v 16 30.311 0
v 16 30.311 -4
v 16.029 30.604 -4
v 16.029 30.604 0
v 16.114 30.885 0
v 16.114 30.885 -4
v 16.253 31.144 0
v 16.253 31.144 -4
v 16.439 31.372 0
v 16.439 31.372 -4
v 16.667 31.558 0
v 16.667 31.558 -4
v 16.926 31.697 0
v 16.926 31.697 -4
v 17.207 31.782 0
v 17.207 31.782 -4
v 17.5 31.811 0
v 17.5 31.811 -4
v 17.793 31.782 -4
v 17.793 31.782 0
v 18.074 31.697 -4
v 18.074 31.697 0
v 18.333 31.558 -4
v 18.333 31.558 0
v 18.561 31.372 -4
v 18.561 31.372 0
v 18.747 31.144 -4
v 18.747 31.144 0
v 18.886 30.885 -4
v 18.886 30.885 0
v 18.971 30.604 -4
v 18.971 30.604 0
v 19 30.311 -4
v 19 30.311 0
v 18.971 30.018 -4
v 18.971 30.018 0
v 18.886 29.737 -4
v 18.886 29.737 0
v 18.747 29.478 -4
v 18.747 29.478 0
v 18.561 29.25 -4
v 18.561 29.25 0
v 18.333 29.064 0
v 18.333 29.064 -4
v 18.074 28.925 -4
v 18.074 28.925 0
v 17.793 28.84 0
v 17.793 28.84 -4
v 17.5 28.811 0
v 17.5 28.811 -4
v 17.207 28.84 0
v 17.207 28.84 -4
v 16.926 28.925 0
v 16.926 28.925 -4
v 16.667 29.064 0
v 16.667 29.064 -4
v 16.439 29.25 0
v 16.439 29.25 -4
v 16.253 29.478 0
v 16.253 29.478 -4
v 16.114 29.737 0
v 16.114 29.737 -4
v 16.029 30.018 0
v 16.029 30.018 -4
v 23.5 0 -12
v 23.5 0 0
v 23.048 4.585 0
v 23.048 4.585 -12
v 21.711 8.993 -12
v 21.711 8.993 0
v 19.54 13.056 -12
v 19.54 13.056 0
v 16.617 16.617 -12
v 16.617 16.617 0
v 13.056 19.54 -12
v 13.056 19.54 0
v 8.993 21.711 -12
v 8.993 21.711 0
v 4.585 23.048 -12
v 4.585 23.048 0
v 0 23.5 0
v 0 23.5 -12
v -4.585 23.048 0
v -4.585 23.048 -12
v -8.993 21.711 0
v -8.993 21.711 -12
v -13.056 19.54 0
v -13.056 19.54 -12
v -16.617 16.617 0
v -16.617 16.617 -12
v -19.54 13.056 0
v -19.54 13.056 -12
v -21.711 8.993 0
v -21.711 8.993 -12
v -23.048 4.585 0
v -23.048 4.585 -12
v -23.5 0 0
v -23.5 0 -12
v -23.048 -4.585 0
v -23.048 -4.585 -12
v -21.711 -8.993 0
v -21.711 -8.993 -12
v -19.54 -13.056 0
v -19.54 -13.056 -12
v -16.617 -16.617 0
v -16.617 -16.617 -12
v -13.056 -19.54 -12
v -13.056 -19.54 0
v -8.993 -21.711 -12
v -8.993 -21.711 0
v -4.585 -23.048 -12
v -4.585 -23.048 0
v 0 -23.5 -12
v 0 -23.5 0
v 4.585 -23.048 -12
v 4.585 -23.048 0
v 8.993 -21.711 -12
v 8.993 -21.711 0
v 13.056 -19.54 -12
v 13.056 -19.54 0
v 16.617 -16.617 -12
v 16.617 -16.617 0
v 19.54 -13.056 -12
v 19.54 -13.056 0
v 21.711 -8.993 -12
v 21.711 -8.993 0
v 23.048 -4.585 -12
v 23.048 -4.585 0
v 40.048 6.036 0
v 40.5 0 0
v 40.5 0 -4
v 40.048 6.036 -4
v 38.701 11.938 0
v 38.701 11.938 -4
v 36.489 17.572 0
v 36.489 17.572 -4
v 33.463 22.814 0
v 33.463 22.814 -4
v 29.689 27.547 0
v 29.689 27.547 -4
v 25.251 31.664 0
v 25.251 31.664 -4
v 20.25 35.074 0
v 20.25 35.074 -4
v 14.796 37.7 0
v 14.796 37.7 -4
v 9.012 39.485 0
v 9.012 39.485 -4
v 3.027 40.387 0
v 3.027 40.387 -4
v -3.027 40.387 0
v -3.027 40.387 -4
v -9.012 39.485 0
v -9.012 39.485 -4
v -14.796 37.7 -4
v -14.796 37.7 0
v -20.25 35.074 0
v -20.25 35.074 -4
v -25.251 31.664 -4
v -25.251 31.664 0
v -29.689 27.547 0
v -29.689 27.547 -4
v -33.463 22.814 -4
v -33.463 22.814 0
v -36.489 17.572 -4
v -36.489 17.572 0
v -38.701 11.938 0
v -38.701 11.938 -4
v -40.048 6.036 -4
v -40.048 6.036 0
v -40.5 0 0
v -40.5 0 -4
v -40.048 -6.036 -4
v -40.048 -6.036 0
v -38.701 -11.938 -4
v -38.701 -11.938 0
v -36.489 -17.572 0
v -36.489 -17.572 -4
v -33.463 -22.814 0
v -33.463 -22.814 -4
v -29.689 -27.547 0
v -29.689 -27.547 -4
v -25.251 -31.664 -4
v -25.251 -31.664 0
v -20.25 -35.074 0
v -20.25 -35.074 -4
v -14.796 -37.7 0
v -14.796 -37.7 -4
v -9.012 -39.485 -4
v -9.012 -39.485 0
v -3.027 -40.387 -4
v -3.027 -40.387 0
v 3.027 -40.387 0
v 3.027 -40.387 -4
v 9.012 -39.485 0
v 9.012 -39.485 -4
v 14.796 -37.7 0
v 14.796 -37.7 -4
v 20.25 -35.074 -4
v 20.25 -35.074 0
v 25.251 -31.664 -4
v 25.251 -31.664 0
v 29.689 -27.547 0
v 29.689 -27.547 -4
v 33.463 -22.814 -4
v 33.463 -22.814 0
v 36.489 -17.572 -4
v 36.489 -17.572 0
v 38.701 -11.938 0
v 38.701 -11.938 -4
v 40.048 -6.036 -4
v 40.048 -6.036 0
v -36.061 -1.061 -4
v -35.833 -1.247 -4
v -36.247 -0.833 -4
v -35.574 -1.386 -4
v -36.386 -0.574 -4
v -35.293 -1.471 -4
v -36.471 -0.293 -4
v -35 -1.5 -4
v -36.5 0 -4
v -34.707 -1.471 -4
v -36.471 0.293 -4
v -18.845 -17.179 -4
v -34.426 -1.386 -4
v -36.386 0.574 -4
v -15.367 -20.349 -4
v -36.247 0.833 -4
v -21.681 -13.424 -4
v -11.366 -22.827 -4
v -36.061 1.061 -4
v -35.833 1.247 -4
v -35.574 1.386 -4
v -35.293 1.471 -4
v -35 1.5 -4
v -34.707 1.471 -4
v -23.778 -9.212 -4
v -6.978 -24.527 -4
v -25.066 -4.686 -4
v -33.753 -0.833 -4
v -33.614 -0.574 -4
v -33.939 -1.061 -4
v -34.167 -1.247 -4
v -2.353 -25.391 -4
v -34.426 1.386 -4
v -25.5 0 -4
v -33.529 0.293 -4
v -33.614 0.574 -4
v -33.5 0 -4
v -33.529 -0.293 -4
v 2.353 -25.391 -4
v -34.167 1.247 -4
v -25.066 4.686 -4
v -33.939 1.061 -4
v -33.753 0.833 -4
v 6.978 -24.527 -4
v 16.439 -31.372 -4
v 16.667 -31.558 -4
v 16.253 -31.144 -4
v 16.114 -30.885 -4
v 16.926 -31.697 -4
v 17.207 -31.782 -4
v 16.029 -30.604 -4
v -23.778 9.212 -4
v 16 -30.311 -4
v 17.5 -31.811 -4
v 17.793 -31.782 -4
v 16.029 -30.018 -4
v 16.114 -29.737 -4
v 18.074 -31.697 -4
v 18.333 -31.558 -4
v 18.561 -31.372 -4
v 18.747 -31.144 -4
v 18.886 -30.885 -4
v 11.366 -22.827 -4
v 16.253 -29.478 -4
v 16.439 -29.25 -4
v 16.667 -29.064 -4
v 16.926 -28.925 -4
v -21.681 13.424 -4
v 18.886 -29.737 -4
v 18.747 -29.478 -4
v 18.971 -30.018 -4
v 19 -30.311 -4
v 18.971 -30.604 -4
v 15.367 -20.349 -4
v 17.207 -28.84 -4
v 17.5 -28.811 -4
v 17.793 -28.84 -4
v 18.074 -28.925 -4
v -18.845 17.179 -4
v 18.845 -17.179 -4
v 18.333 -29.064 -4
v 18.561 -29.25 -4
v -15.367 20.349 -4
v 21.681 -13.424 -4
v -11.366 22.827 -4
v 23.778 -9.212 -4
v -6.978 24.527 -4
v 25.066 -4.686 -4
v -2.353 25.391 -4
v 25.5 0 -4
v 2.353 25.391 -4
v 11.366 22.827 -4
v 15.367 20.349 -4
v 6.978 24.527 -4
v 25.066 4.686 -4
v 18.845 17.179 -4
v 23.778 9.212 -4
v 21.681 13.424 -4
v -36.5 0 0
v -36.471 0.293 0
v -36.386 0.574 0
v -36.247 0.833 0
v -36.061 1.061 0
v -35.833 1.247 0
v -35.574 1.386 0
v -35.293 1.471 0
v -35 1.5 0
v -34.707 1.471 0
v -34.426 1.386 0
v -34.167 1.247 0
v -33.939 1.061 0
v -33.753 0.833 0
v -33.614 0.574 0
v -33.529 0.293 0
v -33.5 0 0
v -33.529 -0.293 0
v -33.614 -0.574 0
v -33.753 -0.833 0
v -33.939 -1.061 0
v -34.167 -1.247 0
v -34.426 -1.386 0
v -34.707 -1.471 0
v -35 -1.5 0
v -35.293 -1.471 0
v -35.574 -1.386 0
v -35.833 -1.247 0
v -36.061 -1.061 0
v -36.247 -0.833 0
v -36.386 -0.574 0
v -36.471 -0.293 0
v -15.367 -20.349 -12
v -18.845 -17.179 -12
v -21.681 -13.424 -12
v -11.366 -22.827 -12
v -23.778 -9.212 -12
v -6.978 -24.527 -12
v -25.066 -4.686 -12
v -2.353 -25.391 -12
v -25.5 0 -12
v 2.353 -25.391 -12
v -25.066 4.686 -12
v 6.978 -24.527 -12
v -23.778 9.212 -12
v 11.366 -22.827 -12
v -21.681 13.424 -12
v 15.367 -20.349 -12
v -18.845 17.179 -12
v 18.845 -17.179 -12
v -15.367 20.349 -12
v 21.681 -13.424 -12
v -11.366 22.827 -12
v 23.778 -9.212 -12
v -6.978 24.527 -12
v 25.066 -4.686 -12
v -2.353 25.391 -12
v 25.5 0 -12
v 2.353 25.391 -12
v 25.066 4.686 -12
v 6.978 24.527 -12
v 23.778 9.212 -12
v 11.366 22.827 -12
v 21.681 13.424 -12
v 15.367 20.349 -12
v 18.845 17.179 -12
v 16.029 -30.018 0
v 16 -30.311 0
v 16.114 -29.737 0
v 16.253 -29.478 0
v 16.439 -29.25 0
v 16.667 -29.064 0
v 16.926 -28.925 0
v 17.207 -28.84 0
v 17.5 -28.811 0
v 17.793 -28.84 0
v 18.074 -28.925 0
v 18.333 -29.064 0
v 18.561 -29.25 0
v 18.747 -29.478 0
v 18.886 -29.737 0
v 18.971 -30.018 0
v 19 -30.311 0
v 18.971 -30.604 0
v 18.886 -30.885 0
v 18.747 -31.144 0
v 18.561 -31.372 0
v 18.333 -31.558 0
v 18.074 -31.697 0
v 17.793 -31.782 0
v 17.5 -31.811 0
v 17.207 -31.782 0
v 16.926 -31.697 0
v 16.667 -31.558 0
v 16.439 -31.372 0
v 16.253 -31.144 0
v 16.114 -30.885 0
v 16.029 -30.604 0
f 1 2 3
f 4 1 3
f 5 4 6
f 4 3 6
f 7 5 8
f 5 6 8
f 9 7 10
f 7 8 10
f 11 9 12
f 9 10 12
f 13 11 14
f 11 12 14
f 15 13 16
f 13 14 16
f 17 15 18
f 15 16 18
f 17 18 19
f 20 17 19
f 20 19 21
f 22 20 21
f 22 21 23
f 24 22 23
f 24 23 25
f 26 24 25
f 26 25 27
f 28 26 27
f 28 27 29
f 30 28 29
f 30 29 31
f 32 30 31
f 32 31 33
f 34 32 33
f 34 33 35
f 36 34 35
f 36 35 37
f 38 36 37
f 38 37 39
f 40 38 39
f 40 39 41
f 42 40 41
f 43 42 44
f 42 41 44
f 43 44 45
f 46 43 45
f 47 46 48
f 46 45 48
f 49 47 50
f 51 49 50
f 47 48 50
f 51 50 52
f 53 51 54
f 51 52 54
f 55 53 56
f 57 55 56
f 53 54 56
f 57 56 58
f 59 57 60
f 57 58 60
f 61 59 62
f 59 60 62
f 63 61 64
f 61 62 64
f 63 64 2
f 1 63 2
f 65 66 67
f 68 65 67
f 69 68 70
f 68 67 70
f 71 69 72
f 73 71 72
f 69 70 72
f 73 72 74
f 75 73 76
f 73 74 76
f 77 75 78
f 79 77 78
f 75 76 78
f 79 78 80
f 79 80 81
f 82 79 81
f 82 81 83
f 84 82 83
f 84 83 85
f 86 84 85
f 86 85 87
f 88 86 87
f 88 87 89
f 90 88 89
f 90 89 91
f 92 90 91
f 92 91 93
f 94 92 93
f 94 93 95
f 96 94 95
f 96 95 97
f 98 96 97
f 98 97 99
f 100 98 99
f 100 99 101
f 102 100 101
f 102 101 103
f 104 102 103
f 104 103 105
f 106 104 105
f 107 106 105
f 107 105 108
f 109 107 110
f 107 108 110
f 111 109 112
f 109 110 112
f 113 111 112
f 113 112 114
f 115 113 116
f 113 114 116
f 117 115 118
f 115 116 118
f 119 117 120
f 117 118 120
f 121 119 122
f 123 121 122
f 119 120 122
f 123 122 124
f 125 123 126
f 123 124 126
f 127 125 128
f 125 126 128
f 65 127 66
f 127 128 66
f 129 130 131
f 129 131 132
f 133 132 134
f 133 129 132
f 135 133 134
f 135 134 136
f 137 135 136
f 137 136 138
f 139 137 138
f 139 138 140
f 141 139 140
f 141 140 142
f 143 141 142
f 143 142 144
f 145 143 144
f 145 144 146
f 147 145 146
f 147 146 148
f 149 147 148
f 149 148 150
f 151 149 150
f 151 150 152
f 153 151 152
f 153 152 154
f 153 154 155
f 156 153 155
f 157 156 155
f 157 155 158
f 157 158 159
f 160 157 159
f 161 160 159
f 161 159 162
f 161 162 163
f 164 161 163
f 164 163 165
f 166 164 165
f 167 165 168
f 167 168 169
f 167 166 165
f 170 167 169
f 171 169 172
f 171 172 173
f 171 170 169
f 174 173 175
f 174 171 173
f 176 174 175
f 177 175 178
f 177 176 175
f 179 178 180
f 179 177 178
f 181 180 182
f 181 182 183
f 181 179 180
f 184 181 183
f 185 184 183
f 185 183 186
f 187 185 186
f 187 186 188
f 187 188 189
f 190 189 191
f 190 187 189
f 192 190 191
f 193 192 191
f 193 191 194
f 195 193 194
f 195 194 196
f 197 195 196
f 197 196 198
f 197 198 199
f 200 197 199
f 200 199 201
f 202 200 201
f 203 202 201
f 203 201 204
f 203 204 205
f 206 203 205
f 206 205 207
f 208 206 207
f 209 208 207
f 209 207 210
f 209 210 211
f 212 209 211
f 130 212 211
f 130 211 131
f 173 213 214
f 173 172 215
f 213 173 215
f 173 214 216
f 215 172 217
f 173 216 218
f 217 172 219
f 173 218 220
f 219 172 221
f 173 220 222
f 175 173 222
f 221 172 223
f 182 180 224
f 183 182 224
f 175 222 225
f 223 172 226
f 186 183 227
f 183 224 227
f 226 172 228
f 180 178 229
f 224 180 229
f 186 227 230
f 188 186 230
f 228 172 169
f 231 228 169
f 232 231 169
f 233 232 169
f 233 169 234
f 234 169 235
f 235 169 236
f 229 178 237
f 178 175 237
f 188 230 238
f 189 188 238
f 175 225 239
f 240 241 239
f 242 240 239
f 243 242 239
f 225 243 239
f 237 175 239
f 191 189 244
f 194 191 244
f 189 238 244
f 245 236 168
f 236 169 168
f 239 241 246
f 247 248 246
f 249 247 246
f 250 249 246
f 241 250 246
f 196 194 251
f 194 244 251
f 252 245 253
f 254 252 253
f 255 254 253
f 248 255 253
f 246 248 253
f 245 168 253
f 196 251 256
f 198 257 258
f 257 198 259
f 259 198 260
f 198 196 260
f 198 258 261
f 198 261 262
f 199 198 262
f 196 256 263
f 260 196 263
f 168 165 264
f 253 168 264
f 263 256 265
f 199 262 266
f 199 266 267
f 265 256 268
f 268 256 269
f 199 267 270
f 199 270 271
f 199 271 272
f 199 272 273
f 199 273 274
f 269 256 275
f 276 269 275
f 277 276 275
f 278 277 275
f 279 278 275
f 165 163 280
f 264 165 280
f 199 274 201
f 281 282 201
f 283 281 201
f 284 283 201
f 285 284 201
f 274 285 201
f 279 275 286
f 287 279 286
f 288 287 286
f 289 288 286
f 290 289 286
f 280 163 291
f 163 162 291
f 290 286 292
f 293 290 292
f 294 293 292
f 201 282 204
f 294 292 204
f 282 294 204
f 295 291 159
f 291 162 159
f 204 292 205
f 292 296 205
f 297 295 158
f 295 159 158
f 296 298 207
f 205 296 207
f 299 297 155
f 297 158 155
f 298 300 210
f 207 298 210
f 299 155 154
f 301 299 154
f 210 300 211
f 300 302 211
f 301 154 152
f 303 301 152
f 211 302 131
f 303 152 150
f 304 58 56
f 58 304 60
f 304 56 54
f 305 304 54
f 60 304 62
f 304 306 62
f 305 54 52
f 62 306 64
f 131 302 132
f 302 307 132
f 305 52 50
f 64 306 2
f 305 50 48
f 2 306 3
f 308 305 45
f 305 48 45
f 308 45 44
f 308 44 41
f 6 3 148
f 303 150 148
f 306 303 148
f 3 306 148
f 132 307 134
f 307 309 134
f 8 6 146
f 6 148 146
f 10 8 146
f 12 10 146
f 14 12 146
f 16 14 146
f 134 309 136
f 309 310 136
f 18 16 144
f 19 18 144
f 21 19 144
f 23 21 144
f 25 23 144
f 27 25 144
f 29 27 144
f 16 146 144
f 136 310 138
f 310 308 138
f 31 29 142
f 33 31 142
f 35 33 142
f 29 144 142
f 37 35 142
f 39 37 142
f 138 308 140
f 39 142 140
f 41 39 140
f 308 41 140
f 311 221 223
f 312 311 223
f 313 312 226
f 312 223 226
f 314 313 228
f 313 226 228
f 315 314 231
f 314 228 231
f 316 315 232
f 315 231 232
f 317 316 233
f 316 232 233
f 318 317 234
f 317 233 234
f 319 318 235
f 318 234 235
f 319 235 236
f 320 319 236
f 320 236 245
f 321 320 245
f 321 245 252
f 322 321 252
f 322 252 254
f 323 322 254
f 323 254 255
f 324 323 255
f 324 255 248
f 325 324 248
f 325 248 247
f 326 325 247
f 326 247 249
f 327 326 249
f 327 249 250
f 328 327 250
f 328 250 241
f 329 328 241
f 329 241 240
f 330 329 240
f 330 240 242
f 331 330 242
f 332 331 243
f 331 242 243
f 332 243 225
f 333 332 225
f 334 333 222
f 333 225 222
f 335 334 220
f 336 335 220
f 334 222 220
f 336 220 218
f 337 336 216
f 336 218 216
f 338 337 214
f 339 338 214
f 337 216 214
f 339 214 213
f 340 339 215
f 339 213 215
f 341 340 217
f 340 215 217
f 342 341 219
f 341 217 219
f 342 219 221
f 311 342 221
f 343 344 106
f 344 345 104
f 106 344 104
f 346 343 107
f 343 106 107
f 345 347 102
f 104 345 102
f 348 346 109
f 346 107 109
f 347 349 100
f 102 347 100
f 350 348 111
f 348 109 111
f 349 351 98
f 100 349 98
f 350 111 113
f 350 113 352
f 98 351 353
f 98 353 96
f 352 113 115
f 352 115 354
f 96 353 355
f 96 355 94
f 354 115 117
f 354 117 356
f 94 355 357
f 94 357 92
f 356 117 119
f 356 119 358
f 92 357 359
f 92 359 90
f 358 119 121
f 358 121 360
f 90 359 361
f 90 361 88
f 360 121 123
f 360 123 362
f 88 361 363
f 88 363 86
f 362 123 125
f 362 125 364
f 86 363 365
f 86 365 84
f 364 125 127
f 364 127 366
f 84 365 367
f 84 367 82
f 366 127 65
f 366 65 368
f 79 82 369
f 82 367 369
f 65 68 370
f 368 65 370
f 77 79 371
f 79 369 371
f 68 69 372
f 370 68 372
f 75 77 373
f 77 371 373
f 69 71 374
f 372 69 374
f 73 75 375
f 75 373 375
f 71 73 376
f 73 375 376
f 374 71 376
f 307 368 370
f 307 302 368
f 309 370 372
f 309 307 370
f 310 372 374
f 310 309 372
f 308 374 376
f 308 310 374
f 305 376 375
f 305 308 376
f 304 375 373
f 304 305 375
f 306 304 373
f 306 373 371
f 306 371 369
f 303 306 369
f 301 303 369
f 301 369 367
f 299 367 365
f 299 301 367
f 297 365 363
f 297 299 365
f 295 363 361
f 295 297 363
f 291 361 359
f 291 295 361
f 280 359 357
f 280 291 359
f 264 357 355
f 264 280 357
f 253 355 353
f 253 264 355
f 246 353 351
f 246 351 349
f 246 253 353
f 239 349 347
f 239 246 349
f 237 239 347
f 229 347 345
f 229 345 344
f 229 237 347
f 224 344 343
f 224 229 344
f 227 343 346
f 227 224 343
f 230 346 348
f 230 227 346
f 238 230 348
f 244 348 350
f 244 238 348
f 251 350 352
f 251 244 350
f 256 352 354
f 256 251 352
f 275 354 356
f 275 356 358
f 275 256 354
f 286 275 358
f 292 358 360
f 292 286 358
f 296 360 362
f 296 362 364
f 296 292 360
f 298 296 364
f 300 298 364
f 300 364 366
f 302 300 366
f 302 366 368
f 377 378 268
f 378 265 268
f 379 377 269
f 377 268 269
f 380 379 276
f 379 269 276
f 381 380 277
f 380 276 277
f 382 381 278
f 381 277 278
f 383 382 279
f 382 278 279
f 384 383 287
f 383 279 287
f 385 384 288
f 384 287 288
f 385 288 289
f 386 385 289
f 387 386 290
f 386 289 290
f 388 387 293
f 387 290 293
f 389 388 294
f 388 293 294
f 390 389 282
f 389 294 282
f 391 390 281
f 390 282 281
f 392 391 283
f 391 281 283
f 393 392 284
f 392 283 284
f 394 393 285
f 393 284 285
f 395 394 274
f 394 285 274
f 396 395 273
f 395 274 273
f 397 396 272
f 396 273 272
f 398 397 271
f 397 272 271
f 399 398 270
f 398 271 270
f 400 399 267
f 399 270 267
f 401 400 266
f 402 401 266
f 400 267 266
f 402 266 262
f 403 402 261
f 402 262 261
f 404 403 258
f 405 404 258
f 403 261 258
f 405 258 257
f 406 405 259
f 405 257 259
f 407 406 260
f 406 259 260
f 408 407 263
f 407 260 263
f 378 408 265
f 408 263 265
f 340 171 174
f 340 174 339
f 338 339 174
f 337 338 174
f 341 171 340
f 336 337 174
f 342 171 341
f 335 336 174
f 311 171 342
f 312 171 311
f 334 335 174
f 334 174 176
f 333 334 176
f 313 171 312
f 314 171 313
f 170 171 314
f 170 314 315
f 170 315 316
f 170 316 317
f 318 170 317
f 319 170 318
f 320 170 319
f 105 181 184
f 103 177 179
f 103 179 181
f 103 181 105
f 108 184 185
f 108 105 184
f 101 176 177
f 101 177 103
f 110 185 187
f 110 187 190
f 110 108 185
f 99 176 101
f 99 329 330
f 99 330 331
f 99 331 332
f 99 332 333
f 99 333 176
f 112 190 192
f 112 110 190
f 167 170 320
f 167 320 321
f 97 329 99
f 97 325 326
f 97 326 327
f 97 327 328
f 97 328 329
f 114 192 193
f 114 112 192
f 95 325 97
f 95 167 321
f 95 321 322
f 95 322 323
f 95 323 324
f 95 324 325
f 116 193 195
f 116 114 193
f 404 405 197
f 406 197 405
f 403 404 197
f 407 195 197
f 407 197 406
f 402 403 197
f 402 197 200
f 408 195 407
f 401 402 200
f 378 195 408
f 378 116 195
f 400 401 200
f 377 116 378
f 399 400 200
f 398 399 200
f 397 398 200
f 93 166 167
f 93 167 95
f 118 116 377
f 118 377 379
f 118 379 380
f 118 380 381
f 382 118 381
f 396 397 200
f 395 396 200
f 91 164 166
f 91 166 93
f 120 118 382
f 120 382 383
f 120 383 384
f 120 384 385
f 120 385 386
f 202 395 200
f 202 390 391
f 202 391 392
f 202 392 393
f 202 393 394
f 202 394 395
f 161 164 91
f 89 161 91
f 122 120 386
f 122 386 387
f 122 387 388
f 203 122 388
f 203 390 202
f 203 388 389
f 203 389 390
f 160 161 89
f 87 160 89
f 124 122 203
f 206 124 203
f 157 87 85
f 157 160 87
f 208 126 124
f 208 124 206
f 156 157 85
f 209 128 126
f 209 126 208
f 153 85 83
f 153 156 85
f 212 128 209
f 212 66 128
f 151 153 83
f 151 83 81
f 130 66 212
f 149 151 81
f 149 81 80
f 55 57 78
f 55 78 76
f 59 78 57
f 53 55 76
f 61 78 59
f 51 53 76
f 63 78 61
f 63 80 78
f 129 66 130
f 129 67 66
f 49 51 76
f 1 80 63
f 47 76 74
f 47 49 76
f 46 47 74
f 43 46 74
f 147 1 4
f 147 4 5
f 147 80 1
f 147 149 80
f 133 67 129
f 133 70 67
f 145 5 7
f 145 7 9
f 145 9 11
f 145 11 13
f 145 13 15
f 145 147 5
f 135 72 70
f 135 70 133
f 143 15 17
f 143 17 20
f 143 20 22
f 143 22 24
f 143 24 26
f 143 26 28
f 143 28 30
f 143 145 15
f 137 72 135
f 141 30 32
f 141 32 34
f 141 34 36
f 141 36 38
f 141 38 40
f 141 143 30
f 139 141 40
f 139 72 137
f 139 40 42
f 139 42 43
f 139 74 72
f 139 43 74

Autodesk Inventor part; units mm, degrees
ref_plane "YZ Plane" through (0, 0, 0) normal (1, 0, 0) x (0, 1, 0)
ref_plane "XZ Plane" through (0, 0, 0) normal (0, 1, 0) x (-1, 0, 0)
ref_plane "XY Plane" through (0, 0, 0) normal (0, 0, 1) x (1, 0, 0)
sketch "Sketch1" plane through (0, 0, 0) normal (0, 0, 1) x (1, 0, 0)
  circle A0 centre (0, 0) radius 23.5
  circle A1 centre (0, 0) radius 25.5
  circle A2 centre (0, 0) radius 40.5
  dimension "d0" = 47
  dimension "d15" = 81
  dimension "d17" = 51
extrude "Extrusion1" add sketch "Sketch1" against normal blind 4 contours A2
extrude "Extrusion2" add sketch "Sketch1" against normal blind 12 contours A1
sketch "Sketch2" plane through (0, 0, -4) normal (0, 0, -1) x (-1, 0, 0)
  circle A0 centre (0, 0) radius 25.5 projected
  circle A1 centre (0, 0) radius 40.5 projected
  circle A2 centre (35, 0) radius 1.5
  circle A3 centre (-17.5, 30.3109) radius 1.5
  circle A4 centre (-17.5, -30.3109) radius 1.5
  dimension "d8" = 35
  dimension "d11" = 360
  dimension "d18" = 3
extrude "Extrusion3" cut sketch "Sketch2" against normal blind 12 contours A2 | A3 | A4
equation "\"d0\" = a"
equation "\"d18\" = e"
equation "\"d9\" = e"
equation "\"a\" = 47"
equation "\"e\" = 3"
properties part number "ACO.RODA25-01"
